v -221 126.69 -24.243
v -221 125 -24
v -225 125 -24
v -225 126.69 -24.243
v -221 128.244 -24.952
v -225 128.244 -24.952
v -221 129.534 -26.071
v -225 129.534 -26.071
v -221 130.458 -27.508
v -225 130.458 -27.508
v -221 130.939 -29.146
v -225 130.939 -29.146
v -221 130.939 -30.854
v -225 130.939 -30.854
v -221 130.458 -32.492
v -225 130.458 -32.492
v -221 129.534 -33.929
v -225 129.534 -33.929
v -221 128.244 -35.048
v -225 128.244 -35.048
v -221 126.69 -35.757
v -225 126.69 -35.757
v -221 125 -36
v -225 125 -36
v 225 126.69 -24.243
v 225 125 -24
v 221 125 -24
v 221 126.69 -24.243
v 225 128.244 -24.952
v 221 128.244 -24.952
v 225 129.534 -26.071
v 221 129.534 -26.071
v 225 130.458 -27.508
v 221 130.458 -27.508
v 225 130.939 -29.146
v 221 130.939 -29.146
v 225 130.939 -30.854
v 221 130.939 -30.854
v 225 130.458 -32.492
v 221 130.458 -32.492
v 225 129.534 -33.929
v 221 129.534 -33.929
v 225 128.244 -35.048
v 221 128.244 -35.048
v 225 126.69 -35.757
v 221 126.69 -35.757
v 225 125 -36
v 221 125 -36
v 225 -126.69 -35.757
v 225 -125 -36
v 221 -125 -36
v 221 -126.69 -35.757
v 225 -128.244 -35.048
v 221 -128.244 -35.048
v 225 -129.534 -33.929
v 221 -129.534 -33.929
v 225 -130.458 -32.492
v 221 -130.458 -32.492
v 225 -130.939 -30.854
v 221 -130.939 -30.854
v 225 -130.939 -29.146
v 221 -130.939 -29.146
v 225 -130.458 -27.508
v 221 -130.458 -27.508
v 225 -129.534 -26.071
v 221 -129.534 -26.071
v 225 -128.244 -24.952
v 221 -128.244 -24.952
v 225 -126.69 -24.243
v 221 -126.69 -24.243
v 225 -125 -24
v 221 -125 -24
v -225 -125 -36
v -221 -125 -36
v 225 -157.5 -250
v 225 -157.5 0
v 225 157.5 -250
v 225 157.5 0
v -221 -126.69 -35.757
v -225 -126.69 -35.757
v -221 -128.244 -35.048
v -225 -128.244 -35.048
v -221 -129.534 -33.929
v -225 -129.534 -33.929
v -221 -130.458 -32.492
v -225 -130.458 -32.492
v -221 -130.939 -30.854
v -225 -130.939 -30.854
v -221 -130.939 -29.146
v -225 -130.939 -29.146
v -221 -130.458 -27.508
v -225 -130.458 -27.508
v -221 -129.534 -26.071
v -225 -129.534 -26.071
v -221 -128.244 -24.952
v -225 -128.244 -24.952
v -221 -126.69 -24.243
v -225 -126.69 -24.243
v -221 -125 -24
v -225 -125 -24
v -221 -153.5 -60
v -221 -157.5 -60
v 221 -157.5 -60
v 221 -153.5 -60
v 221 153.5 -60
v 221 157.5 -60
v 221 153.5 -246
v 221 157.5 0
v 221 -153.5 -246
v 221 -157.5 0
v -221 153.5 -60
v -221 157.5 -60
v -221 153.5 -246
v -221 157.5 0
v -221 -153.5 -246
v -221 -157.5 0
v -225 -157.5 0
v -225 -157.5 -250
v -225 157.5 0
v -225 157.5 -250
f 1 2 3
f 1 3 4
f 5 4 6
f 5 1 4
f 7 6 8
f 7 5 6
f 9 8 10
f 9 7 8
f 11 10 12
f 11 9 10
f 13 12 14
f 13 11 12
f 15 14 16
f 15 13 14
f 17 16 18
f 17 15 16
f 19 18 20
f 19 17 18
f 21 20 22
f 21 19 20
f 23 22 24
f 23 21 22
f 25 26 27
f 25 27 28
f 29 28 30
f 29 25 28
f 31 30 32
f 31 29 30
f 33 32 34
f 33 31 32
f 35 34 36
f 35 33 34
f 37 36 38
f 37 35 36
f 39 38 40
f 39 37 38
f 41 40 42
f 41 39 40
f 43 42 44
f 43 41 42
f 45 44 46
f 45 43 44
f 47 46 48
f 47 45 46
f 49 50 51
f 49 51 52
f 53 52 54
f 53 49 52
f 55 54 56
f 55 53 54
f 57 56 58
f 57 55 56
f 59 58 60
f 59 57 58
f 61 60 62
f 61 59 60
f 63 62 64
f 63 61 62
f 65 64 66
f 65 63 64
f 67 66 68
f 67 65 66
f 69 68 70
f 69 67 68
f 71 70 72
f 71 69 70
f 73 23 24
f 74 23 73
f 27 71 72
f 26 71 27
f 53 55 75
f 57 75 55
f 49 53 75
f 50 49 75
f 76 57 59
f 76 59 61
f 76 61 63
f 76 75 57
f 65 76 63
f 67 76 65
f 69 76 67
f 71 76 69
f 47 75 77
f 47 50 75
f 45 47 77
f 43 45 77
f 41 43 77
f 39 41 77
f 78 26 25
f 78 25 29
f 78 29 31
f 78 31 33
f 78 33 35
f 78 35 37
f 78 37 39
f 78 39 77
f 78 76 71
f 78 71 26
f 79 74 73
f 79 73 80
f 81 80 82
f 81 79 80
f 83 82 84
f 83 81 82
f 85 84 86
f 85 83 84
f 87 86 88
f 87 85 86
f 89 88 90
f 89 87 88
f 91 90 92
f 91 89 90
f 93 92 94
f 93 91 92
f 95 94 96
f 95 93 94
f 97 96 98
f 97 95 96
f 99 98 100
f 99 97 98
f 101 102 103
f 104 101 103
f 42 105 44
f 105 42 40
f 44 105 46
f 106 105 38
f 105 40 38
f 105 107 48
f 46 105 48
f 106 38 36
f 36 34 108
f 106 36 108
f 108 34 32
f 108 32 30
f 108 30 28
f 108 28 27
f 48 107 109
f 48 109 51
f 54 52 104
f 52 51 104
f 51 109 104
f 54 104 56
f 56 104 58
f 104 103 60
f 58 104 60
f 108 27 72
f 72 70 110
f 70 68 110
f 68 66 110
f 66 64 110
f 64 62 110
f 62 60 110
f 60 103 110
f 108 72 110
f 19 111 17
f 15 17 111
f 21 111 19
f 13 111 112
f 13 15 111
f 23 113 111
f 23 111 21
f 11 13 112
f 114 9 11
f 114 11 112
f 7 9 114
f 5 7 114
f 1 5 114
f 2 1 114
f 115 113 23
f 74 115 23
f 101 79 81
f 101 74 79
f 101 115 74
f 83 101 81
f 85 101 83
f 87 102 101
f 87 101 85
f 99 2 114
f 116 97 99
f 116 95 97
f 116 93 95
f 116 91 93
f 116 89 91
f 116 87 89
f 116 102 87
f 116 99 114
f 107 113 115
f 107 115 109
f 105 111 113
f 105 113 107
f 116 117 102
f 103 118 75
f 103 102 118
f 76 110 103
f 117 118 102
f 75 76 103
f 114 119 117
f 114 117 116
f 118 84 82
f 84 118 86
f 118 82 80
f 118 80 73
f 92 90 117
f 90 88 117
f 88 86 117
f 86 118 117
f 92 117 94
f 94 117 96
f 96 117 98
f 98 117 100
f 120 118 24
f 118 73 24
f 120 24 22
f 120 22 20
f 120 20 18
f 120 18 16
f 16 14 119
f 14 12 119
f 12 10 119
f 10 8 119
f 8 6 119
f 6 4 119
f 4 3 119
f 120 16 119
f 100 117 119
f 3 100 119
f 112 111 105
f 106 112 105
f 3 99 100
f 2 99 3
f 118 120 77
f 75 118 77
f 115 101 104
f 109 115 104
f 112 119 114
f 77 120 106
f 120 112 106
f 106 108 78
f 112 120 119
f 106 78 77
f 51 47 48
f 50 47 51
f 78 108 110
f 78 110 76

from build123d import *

# Parameters (mm, degrees)
SKETCH_1_W          = 450
SKETCH_1_H          = 315
EXTRUDE_1_DEPTH     = 250
SHELL_3_T           = -4
SKETCH_4_W          = 442
SKETCH_4_H          = 60
CUT_EXTRUDE_1_DEPTH = 316
CUT_EXTRUDE_2_DEPTH = 451


with BuildPart() as part:
    # 草图1 → 凸台-拉伸1 (new body)
    with BuildSketch(Plane.XY):
        Rectangle(SKETCH_1_W, SKETCH_1_H)
    extrude(amount=-EXTRUDE_1_DEPTH)

    # 抽壳3
    shell_3_openings = [part.faces().sort_by_distance(p)[0] for p in [
        (0, 0, 0),
    ]]
    offset(amount=SHELL_3_T, openings=shell_3_openings, kind=Kind.INTERSECTION)

    # 草图4 → 切除-拉伸1 (cut, through all)
    with BuildSketch(Plane.XZ.offset(157.5)):
        with Locations((0, -30)):
            Rectangle(SKETCH_4_W, SKETCH_4_H)
    extrude(amount=-CUT_EXTRUDE_1_DEPTH, mode=Mode.SUBTRACT)

    # 草图5 → 切除-拉伸2 (cut, through all)
    with BuildSketch(Plane(origin=(225, 0, 0), x_dir=(0, 0, -1), z_dir=(1, 0, 0))):
        with BuildLine():
            Line((36, 125), (36, -125))
            ThreePointArc((36, -125), (30, -131), (24, -125))
            Line((24, -125), (24, 125))
            ThreePointArc((24, 125), (30, 131), (36, 125))
        make_face()
    extrude(amount=-CUT_EXTRUDE_2_DEPTH, mode=Mode.SUBTRACT)


solid = part.part
